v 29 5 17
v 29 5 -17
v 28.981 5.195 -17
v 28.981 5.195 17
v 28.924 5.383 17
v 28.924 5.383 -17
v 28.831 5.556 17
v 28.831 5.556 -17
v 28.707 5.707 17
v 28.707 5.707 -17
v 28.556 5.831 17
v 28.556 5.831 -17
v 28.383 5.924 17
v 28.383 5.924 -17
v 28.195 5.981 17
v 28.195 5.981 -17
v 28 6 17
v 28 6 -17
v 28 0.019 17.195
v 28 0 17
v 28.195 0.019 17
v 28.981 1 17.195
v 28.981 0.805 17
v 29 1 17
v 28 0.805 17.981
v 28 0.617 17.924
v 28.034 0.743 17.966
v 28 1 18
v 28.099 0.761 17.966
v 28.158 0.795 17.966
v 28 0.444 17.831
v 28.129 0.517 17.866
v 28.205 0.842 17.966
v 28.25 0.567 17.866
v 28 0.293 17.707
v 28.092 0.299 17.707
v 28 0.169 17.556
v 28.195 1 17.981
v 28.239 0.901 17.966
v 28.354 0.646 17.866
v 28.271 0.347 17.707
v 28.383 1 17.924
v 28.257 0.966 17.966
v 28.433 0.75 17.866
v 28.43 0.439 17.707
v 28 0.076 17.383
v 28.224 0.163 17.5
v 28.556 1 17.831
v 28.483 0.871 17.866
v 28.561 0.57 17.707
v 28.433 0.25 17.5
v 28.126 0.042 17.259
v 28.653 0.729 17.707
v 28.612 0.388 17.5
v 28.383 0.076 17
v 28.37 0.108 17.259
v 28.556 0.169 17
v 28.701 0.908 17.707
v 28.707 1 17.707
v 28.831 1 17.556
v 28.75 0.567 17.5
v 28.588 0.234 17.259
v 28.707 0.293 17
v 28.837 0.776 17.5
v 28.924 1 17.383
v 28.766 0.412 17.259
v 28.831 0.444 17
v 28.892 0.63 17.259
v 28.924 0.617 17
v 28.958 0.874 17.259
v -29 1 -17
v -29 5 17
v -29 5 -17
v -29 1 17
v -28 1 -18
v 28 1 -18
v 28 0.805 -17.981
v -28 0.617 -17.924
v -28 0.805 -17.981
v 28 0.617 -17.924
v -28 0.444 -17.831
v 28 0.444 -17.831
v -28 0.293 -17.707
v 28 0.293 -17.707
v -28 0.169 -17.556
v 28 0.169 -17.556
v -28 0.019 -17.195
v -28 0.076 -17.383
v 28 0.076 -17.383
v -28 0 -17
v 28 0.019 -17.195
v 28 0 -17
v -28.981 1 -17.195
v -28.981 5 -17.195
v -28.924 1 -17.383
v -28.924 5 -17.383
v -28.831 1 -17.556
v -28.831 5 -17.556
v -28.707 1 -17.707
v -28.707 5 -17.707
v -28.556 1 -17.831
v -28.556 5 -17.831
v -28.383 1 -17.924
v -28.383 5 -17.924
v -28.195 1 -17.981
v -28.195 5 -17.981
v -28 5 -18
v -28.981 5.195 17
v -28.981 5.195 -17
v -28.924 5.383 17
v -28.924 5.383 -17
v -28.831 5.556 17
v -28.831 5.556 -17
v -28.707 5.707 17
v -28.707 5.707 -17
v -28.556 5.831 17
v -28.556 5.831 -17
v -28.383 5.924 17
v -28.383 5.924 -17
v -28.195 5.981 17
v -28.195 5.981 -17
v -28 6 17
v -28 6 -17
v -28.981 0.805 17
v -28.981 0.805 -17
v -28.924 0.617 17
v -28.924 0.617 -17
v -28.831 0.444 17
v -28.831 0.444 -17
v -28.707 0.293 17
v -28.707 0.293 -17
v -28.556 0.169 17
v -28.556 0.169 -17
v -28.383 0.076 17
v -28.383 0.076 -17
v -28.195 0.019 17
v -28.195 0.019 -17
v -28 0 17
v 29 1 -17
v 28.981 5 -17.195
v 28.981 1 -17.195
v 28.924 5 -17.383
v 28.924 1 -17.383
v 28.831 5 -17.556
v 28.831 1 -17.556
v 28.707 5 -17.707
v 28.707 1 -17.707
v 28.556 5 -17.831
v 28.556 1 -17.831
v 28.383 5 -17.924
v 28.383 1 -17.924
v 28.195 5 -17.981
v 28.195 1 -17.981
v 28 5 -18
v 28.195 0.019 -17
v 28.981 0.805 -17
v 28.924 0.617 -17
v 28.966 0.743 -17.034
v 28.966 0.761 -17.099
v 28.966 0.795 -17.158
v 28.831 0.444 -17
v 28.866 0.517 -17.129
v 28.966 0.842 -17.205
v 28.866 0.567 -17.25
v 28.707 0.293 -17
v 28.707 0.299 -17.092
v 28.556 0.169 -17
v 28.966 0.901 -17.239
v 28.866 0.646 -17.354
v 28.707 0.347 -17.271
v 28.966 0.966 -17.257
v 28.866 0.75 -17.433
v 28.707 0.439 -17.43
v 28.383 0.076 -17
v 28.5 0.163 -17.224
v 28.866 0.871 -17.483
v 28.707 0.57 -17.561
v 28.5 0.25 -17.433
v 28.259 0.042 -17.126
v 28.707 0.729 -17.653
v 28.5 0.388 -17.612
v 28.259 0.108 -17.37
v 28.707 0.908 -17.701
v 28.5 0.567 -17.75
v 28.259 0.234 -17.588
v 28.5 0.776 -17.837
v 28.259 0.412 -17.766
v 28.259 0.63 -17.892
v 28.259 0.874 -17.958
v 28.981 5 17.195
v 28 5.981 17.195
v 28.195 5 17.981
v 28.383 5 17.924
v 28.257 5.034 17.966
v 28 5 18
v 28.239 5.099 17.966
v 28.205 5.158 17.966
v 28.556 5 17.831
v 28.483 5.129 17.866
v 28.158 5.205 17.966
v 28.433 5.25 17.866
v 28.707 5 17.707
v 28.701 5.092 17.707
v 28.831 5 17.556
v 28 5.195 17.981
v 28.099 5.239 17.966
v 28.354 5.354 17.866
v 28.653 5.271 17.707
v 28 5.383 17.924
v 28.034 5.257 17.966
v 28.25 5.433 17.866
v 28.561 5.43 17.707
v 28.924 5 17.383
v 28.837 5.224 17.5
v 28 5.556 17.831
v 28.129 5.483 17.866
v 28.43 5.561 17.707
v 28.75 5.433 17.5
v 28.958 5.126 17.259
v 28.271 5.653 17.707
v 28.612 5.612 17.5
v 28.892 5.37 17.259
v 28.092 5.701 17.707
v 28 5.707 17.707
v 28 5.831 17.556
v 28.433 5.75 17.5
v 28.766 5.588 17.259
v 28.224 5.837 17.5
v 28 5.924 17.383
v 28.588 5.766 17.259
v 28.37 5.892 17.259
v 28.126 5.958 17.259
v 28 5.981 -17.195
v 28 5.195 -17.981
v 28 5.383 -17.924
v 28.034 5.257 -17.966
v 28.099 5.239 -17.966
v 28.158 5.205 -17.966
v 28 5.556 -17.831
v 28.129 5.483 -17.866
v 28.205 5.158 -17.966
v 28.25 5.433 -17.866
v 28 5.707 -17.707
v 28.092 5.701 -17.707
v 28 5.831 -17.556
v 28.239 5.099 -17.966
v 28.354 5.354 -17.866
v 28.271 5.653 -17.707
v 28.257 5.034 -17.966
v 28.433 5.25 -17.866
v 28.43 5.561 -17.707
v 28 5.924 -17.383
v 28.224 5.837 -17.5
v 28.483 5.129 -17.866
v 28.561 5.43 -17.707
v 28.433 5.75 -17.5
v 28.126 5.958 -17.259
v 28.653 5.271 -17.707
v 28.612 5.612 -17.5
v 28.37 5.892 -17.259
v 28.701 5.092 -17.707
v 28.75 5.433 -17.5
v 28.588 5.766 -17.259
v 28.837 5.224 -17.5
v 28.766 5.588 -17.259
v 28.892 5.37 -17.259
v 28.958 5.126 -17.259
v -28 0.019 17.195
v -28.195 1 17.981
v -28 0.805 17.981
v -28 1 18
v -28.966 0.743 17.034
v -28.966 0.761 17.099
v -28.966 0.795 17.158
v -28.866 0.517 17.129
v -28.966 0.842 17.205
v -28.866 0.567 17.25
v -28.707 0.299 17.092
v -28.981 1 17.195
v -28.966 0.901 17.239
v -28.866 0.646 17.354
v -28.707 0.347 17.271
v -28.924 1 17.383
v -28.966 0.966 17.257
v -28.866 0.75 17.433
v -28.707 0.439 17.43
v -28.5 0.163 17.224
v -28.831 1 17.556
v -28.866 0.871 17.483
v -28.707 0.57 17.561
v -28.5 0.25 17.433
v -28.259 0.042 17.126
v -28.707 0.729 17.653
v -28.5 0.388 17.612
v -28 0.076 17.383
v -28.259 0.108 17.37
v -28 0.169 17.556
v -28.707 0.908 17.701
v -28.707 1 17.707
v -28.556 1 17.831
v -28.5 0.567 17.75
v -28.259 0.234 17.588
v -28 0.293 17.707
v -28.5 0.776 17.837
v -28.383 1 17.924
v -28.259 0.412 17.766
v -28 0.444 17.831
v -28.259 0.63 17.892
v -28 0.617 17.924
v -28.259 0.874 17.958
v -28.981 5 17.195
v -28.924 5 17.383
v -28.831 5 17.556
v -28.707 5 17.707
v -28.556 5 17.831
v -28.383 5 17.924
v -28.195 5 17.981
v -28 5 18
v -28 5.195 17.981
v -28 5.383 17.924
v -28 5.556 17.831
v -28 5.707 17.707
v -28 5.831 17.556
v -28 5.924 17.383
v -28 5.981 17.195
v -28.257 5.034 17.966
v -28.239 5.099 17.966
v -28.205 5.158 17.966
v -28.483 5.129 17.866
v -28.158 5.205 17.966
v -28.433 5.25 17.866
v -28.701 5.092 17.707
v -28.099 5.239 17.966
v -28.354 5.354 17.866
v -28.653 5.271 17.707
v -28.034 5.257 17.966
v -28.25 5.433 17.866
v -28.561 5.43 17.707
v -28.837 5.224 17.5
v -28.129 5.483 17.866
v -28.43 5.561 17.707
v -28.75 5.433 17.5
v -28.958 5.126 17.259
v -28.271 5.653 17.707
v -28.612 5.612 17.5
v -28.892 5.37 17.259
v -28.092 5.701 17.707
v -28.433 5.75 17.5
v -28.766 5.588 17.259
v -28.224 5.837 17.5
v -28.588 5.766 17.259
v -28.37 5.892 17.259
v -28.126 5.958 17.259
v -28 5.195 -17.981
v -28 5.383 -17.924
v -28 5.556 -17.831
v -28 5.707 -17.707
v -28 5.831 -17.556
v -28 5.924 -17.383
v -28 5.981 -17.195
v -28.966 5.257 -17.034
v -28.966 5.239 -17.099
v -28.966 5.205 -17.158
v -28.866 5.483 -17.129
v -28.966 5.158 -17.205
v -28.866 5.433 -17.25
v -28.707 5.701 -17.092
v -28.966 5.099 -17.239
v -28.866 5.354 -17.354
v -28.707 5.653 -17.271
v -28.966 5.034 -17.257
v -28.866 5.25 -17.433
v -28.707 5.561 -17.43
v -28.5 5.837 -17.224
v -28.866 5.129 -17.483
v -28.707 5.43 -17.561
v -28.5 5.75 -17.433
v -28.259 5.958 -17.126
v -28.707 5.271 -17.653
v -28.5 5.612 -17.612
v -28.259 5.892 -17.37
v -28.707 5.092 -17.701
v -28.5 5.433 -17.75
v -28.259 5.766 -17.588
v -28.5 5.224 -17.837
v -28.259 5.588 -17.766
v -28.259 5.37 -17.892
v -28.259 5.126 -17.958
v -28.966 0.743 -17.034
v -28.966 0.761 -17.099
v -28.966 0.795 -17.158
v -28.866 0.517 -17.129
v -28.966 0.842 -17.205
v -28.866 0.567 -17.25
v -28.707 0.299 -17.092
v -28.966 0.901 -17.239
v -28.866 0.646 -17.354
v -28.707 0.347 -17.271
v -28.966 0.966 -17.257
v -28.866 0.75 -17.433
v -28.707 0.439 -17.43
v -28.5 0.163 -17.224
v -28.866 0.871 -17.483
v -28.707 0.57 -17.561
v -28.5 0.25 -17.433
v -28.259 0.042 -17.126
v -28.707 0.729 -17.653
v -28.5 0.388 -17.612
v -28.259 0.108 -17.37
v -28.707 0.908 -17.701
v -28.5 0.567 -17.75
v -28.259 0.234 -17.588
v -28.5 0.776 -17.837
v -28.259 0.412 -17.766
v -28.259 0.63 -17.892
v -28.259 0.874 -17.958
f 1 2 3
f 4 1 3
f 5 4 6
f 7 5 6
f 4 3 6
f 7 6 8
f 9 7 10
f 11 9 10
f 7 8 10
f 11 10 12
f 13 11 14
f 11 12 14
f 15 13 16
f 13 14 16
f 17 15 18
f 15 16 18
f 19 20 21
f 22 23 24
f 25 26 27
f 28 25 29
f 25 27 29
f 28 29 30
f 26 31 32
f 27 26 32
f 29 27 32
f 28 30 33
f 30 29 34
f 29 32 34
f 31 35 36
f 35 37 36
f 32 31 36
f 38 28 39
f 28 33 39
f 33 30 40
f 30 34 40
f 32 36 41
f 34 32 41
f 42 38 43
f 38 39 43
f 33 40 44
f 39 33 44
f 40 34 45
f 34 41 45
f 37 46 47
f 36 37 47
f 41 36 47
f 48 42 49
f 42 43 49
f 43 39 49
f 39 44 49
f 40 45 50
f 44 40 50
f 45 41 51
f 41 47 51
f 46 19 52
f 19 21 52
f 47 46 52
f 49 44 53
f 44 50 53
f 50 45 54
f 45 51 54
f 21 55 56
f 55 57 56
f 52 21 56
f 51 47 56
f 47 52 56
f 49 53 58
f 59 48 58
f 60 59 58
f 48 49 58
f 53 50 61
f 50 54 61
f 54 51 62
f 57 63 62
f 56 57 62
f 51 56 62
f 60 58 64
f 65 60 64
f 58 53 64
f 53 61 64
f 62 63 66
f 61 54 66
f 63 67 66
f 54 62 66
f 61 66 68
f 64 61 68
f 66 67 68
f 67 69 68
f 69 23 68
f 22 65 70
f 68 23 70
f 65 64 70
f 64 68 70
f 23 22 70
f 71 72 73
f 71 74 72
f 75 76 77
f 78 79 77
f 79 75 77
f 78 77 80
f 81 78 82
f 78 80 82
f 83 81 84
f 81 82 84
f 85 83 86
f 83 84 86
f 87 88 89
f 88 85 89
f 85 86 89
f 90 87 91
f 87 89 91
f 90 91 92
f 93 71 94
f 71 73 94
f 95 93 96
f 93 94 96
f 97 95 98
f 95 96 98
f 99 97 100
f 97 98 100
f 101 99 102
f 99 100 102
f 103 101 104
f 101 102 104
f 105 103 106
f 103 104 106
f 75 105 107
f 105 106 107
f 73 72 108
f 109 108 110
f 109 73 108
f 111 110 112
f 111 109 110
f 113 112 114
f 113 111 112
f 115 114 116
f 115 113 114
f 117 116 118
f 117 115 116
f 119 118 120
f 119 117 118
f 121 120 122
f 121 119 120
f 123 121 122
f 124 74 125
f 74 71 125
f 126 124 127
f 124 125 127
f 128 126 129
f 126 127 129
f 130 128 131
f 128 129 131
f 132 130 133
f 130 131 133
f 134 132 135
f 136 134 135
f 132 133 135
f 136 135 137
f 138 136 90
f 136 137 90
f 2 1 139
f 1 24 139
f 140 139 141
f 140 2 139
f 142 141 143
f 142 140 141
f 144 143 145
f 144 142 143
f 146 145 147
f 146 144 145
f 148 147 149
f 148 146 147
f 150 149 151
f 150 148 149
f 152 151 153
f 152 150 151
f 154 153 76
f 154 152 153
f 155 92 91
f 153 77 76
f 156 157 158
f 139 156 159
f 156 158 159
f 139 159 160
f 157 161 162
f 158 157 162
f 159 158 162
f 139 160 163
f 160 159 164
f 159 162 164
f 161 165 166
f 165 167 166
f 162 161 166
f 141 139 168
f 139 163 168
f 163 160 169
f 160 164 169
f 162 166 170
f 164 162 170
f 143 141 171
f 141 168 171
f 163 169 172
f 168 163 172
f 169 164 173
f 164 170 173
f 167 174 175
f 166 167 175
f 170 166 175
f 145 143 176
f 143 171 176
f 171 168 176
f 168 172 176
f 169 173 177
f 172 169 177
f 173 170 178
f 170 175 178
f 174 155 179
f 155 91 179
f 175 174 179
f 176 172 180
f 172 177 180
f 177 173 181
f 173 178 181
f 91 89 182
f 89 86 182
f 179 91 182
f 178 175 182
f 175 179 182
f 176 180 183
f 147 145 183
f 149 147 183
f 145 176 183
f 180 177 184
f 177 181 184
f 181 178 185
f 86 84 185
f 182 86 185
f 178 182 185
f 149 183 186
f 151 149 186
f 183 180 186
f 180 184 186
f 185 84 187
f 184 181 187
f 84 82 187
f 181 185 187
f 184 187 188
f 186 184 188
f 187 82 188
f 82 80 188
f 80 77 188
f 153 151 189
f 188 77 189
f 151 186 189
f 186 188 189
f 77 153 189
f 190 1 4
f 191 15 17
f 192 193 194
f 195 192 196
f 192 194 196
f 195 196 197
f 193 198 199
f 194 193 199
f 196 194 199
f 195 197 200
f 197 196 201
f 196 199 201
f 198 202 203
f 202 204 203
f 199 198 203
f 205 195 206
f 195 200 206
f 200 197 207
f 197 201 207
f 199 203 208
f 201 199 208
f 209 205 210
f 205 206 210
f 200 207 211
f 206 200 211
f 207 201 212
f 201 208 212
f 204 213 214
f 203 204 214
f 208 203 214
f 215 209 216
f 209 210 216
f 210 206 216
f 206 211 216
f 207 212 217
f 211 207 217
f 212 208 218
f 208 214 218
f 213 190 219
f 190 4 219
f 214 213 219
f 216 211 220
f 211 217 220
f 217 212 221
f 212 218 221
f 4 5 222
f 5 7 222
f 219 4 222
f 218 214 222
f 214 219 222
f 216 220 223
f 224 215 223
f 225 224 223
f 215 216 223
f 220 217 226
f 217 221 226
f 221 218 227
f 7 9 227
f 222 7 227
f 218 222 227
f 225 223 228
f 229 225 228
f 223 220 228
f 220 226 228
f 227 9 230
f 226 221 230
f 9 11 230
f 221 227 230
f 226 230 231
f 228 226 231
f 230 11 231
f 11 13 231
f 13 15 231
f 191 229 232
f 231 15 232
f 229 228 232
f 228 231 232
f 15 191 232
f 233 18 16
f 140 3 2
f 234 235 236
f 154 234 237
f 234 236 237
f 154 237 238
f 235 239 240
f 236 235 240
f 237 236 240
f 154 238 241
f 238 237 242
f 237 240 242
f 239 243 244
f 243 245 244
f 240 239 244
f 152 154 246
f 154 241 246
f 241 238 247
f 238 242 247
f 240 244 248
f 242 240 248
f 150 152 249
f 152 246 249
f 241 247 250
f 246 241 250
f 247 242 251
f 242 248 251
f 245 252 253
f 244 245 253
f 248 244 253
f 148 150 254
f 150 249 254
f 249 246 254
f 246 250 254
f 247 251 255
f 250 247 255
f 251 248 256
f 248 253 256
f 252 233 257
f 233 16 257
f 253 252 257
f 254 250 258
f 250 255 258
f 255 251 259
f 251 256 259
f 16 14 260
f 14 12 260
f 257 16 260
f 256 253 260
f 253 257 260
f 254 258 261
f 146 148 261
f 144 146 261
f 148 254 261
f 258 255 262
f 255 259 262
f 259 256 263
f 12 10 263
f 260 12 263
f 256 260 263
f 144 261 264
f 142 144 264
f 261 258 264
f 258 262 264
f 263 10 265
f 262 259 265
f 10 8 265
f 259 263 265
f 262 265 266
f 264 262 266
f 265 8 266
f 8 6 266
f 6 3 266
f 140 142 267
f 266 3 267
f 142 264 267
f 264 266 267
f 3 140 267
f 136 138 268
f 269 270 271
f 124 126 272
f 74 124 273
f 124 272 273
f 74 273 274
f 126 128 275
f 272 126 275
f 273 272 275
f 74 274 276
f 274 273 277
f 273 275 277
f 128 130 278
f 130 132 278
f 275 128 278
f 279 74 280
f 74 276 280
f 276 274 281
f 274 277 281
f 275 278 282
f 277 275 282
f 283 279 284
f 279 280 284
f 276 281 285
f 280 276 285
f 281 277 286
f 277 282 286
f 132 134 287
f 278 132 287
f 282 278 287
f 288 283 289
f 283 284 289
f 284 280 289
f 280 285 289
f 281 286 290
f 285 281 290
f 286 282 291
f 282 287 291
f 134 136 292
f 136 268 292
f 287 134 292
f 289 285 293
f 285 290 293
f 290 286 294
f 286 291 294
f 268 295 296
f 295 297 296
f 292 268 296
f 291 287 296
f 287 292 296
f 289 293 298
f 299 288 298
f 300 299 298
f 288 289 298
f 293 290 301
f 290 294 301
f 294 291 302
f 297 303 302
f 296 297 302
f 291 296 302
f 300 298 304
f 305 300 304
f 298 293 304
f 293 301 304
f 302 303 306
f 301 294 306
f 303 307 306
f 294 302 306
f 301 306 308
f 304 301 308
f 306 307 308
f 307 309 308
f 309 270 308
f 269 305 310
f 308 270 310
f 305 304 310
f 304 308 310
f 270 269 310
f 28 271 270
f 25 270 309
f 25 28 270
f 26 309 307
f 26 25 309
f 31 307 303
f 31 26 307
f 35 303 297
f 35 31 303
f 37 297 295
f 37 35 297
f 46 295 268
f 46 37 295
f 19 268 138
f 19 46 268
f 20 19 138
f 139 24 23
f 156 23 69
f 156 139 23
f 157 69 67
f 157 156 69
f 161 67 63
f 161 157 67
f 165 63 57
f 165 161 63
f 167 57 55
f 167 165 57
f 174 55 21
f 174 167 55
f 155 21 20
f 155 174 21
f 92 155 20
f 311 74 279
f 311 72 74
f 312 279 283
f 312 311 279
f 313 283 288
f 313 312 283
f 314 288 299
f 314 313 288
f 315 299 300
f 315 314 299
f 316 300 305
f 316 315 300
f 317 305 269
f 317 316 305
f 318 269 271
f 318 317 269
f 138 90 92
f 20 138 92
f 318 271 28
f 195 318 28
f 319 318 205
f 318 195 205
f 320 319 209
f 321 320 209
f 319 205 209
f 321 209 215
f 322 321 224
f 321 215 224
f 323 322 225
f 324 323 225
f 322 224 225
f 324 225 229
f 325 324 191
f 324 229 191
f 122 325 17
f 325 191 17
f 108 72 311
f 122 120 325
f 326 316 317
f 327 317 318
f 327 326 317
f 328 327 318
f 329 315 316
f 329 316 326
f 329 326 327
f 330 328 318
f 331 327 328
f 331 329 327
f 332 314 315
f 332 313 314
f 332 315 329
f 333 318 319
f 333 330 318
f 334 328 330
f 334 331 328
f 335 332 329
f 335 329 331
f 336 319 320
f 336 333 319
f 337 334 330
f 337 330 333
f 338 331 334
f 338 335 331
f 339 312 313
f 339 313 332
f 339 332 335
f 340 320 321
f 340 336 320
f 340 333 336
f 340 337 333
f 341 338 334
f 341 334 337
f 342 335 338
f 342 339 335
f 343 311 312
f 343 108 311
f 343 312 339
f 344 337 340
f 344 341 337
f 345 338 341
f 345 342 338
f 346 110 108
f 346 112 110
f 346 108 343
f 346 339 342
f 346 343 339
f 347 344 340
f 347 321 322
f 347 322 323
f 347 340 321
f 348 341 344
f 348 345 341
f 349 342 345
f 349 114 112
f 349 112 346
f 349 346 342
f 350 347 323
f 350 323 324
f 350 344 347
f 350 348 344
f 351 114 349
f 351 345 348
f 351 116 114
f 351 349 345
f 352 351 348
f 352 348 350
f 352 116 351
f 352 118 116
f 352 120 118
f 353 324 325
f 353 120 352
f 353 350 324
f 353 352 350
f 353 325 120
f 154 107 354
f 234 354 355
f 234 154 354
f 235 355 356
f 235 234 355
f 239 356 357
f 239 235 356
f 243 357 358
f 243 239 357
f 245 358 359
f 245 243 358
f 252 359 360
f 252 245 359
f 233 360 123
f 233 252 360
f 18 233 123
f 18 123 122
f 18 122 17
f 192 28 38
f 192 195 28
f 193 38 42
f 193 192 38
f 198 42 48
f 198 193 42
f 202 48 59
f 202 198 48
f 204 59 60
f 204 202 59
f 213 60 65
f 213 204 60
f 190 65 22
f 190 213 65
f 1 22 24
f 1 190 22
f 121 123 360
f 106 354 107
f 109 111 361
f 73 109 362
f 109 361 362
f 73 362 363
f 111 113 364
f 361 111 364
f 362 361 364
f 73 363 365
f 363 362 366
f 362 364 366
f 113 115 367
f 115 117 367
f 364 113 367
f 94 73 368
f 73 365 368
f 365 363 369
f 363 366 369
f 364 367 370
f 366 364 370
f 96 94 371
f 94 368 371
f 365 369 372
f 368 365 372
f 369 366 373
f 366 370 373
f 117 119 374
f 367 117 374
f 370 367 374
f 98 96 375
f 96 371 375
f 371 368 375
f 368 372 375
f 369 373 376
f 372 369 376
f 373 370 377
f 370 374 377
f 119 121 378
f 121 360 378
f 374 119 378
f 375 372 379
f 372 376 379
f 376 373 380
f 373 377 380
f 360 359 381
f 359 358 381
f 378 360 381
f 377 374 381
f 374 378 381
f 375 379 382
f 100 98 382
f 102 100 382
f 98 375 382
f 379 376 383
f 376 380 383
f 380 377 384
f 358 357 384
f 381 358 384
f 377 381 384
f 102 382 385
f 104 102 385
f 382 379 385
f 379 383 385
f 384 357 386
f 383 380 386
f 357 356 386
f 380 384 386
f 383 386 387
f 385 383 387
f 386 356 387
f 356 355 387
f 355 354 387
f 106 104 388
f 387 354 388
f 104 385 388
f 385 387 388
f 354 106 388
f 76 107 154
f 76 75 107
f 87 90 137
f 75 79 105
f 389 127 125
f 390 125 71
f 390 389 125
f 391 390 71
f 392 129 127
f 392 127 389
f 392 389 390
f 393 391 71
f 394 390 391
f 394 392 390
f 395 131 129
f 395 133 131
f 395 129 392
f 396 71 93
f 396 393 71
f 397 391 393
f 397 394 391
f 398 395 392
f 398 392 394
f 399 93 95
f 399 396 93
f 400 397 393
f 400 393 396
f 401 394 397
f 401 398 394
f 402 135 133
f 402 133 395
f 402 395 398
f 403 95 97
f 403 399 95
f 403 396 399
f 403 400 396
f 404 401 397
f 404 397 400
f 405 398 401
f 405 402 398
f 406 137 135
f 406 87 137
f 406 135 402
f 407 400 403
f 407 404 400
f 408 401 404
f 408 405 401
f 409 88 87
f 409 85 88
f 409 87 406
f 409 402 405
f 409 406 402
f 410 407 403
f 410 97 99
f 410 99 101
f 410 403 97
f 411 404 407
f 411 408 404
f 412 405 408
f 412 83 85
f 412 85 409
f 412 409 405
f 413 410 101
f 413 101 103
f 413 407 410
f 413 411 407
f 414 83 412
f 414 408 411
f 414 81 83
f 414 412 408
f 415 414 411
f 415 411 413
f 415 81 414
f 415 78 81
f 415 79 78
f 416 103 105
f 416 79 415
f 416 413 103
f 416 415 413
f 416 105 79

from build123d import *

# Parameters (mm, degrees)
ESBO_O1_W                = 58
ESBO_O1_H                = 36
RESSALTO_EXTRUS_O1_DEPTH = 6
FILETE1_R                = 1


with BuildPart() as part:
    # Esboço1 → Ressalto-extrusão1 (new body)
    with BuildSketch(Plane(origin=(0, 0, 0), x_dir=(1, 0, 0), z_dir=(0, 1, 0))):
        Rectangle(ESBO_O1_W, ESBO_O1_H)
    extrude(amount=RESSALTO_EXTRUS_O1_DEPTH)

    # Filete1
    filete1_edges = [part.edges().sort_by_distance(p)[0] for p in [
        (29, 6, 0),
        (0, 6, -18),
        (-29, 6, 0),
        (0, 0, -18),
        (29, 0, 0),
        (0, 0, 18),
        (-29, 0, 0),
        (-29, 3, -18),
        (29, 3, -18),
        (29, 3, 18),
        (-29, 3, 18),
        (0, 6, 18),
    ]]
    fillet(filete1_edges, radius=FILETE1_R)


solid = part.part
